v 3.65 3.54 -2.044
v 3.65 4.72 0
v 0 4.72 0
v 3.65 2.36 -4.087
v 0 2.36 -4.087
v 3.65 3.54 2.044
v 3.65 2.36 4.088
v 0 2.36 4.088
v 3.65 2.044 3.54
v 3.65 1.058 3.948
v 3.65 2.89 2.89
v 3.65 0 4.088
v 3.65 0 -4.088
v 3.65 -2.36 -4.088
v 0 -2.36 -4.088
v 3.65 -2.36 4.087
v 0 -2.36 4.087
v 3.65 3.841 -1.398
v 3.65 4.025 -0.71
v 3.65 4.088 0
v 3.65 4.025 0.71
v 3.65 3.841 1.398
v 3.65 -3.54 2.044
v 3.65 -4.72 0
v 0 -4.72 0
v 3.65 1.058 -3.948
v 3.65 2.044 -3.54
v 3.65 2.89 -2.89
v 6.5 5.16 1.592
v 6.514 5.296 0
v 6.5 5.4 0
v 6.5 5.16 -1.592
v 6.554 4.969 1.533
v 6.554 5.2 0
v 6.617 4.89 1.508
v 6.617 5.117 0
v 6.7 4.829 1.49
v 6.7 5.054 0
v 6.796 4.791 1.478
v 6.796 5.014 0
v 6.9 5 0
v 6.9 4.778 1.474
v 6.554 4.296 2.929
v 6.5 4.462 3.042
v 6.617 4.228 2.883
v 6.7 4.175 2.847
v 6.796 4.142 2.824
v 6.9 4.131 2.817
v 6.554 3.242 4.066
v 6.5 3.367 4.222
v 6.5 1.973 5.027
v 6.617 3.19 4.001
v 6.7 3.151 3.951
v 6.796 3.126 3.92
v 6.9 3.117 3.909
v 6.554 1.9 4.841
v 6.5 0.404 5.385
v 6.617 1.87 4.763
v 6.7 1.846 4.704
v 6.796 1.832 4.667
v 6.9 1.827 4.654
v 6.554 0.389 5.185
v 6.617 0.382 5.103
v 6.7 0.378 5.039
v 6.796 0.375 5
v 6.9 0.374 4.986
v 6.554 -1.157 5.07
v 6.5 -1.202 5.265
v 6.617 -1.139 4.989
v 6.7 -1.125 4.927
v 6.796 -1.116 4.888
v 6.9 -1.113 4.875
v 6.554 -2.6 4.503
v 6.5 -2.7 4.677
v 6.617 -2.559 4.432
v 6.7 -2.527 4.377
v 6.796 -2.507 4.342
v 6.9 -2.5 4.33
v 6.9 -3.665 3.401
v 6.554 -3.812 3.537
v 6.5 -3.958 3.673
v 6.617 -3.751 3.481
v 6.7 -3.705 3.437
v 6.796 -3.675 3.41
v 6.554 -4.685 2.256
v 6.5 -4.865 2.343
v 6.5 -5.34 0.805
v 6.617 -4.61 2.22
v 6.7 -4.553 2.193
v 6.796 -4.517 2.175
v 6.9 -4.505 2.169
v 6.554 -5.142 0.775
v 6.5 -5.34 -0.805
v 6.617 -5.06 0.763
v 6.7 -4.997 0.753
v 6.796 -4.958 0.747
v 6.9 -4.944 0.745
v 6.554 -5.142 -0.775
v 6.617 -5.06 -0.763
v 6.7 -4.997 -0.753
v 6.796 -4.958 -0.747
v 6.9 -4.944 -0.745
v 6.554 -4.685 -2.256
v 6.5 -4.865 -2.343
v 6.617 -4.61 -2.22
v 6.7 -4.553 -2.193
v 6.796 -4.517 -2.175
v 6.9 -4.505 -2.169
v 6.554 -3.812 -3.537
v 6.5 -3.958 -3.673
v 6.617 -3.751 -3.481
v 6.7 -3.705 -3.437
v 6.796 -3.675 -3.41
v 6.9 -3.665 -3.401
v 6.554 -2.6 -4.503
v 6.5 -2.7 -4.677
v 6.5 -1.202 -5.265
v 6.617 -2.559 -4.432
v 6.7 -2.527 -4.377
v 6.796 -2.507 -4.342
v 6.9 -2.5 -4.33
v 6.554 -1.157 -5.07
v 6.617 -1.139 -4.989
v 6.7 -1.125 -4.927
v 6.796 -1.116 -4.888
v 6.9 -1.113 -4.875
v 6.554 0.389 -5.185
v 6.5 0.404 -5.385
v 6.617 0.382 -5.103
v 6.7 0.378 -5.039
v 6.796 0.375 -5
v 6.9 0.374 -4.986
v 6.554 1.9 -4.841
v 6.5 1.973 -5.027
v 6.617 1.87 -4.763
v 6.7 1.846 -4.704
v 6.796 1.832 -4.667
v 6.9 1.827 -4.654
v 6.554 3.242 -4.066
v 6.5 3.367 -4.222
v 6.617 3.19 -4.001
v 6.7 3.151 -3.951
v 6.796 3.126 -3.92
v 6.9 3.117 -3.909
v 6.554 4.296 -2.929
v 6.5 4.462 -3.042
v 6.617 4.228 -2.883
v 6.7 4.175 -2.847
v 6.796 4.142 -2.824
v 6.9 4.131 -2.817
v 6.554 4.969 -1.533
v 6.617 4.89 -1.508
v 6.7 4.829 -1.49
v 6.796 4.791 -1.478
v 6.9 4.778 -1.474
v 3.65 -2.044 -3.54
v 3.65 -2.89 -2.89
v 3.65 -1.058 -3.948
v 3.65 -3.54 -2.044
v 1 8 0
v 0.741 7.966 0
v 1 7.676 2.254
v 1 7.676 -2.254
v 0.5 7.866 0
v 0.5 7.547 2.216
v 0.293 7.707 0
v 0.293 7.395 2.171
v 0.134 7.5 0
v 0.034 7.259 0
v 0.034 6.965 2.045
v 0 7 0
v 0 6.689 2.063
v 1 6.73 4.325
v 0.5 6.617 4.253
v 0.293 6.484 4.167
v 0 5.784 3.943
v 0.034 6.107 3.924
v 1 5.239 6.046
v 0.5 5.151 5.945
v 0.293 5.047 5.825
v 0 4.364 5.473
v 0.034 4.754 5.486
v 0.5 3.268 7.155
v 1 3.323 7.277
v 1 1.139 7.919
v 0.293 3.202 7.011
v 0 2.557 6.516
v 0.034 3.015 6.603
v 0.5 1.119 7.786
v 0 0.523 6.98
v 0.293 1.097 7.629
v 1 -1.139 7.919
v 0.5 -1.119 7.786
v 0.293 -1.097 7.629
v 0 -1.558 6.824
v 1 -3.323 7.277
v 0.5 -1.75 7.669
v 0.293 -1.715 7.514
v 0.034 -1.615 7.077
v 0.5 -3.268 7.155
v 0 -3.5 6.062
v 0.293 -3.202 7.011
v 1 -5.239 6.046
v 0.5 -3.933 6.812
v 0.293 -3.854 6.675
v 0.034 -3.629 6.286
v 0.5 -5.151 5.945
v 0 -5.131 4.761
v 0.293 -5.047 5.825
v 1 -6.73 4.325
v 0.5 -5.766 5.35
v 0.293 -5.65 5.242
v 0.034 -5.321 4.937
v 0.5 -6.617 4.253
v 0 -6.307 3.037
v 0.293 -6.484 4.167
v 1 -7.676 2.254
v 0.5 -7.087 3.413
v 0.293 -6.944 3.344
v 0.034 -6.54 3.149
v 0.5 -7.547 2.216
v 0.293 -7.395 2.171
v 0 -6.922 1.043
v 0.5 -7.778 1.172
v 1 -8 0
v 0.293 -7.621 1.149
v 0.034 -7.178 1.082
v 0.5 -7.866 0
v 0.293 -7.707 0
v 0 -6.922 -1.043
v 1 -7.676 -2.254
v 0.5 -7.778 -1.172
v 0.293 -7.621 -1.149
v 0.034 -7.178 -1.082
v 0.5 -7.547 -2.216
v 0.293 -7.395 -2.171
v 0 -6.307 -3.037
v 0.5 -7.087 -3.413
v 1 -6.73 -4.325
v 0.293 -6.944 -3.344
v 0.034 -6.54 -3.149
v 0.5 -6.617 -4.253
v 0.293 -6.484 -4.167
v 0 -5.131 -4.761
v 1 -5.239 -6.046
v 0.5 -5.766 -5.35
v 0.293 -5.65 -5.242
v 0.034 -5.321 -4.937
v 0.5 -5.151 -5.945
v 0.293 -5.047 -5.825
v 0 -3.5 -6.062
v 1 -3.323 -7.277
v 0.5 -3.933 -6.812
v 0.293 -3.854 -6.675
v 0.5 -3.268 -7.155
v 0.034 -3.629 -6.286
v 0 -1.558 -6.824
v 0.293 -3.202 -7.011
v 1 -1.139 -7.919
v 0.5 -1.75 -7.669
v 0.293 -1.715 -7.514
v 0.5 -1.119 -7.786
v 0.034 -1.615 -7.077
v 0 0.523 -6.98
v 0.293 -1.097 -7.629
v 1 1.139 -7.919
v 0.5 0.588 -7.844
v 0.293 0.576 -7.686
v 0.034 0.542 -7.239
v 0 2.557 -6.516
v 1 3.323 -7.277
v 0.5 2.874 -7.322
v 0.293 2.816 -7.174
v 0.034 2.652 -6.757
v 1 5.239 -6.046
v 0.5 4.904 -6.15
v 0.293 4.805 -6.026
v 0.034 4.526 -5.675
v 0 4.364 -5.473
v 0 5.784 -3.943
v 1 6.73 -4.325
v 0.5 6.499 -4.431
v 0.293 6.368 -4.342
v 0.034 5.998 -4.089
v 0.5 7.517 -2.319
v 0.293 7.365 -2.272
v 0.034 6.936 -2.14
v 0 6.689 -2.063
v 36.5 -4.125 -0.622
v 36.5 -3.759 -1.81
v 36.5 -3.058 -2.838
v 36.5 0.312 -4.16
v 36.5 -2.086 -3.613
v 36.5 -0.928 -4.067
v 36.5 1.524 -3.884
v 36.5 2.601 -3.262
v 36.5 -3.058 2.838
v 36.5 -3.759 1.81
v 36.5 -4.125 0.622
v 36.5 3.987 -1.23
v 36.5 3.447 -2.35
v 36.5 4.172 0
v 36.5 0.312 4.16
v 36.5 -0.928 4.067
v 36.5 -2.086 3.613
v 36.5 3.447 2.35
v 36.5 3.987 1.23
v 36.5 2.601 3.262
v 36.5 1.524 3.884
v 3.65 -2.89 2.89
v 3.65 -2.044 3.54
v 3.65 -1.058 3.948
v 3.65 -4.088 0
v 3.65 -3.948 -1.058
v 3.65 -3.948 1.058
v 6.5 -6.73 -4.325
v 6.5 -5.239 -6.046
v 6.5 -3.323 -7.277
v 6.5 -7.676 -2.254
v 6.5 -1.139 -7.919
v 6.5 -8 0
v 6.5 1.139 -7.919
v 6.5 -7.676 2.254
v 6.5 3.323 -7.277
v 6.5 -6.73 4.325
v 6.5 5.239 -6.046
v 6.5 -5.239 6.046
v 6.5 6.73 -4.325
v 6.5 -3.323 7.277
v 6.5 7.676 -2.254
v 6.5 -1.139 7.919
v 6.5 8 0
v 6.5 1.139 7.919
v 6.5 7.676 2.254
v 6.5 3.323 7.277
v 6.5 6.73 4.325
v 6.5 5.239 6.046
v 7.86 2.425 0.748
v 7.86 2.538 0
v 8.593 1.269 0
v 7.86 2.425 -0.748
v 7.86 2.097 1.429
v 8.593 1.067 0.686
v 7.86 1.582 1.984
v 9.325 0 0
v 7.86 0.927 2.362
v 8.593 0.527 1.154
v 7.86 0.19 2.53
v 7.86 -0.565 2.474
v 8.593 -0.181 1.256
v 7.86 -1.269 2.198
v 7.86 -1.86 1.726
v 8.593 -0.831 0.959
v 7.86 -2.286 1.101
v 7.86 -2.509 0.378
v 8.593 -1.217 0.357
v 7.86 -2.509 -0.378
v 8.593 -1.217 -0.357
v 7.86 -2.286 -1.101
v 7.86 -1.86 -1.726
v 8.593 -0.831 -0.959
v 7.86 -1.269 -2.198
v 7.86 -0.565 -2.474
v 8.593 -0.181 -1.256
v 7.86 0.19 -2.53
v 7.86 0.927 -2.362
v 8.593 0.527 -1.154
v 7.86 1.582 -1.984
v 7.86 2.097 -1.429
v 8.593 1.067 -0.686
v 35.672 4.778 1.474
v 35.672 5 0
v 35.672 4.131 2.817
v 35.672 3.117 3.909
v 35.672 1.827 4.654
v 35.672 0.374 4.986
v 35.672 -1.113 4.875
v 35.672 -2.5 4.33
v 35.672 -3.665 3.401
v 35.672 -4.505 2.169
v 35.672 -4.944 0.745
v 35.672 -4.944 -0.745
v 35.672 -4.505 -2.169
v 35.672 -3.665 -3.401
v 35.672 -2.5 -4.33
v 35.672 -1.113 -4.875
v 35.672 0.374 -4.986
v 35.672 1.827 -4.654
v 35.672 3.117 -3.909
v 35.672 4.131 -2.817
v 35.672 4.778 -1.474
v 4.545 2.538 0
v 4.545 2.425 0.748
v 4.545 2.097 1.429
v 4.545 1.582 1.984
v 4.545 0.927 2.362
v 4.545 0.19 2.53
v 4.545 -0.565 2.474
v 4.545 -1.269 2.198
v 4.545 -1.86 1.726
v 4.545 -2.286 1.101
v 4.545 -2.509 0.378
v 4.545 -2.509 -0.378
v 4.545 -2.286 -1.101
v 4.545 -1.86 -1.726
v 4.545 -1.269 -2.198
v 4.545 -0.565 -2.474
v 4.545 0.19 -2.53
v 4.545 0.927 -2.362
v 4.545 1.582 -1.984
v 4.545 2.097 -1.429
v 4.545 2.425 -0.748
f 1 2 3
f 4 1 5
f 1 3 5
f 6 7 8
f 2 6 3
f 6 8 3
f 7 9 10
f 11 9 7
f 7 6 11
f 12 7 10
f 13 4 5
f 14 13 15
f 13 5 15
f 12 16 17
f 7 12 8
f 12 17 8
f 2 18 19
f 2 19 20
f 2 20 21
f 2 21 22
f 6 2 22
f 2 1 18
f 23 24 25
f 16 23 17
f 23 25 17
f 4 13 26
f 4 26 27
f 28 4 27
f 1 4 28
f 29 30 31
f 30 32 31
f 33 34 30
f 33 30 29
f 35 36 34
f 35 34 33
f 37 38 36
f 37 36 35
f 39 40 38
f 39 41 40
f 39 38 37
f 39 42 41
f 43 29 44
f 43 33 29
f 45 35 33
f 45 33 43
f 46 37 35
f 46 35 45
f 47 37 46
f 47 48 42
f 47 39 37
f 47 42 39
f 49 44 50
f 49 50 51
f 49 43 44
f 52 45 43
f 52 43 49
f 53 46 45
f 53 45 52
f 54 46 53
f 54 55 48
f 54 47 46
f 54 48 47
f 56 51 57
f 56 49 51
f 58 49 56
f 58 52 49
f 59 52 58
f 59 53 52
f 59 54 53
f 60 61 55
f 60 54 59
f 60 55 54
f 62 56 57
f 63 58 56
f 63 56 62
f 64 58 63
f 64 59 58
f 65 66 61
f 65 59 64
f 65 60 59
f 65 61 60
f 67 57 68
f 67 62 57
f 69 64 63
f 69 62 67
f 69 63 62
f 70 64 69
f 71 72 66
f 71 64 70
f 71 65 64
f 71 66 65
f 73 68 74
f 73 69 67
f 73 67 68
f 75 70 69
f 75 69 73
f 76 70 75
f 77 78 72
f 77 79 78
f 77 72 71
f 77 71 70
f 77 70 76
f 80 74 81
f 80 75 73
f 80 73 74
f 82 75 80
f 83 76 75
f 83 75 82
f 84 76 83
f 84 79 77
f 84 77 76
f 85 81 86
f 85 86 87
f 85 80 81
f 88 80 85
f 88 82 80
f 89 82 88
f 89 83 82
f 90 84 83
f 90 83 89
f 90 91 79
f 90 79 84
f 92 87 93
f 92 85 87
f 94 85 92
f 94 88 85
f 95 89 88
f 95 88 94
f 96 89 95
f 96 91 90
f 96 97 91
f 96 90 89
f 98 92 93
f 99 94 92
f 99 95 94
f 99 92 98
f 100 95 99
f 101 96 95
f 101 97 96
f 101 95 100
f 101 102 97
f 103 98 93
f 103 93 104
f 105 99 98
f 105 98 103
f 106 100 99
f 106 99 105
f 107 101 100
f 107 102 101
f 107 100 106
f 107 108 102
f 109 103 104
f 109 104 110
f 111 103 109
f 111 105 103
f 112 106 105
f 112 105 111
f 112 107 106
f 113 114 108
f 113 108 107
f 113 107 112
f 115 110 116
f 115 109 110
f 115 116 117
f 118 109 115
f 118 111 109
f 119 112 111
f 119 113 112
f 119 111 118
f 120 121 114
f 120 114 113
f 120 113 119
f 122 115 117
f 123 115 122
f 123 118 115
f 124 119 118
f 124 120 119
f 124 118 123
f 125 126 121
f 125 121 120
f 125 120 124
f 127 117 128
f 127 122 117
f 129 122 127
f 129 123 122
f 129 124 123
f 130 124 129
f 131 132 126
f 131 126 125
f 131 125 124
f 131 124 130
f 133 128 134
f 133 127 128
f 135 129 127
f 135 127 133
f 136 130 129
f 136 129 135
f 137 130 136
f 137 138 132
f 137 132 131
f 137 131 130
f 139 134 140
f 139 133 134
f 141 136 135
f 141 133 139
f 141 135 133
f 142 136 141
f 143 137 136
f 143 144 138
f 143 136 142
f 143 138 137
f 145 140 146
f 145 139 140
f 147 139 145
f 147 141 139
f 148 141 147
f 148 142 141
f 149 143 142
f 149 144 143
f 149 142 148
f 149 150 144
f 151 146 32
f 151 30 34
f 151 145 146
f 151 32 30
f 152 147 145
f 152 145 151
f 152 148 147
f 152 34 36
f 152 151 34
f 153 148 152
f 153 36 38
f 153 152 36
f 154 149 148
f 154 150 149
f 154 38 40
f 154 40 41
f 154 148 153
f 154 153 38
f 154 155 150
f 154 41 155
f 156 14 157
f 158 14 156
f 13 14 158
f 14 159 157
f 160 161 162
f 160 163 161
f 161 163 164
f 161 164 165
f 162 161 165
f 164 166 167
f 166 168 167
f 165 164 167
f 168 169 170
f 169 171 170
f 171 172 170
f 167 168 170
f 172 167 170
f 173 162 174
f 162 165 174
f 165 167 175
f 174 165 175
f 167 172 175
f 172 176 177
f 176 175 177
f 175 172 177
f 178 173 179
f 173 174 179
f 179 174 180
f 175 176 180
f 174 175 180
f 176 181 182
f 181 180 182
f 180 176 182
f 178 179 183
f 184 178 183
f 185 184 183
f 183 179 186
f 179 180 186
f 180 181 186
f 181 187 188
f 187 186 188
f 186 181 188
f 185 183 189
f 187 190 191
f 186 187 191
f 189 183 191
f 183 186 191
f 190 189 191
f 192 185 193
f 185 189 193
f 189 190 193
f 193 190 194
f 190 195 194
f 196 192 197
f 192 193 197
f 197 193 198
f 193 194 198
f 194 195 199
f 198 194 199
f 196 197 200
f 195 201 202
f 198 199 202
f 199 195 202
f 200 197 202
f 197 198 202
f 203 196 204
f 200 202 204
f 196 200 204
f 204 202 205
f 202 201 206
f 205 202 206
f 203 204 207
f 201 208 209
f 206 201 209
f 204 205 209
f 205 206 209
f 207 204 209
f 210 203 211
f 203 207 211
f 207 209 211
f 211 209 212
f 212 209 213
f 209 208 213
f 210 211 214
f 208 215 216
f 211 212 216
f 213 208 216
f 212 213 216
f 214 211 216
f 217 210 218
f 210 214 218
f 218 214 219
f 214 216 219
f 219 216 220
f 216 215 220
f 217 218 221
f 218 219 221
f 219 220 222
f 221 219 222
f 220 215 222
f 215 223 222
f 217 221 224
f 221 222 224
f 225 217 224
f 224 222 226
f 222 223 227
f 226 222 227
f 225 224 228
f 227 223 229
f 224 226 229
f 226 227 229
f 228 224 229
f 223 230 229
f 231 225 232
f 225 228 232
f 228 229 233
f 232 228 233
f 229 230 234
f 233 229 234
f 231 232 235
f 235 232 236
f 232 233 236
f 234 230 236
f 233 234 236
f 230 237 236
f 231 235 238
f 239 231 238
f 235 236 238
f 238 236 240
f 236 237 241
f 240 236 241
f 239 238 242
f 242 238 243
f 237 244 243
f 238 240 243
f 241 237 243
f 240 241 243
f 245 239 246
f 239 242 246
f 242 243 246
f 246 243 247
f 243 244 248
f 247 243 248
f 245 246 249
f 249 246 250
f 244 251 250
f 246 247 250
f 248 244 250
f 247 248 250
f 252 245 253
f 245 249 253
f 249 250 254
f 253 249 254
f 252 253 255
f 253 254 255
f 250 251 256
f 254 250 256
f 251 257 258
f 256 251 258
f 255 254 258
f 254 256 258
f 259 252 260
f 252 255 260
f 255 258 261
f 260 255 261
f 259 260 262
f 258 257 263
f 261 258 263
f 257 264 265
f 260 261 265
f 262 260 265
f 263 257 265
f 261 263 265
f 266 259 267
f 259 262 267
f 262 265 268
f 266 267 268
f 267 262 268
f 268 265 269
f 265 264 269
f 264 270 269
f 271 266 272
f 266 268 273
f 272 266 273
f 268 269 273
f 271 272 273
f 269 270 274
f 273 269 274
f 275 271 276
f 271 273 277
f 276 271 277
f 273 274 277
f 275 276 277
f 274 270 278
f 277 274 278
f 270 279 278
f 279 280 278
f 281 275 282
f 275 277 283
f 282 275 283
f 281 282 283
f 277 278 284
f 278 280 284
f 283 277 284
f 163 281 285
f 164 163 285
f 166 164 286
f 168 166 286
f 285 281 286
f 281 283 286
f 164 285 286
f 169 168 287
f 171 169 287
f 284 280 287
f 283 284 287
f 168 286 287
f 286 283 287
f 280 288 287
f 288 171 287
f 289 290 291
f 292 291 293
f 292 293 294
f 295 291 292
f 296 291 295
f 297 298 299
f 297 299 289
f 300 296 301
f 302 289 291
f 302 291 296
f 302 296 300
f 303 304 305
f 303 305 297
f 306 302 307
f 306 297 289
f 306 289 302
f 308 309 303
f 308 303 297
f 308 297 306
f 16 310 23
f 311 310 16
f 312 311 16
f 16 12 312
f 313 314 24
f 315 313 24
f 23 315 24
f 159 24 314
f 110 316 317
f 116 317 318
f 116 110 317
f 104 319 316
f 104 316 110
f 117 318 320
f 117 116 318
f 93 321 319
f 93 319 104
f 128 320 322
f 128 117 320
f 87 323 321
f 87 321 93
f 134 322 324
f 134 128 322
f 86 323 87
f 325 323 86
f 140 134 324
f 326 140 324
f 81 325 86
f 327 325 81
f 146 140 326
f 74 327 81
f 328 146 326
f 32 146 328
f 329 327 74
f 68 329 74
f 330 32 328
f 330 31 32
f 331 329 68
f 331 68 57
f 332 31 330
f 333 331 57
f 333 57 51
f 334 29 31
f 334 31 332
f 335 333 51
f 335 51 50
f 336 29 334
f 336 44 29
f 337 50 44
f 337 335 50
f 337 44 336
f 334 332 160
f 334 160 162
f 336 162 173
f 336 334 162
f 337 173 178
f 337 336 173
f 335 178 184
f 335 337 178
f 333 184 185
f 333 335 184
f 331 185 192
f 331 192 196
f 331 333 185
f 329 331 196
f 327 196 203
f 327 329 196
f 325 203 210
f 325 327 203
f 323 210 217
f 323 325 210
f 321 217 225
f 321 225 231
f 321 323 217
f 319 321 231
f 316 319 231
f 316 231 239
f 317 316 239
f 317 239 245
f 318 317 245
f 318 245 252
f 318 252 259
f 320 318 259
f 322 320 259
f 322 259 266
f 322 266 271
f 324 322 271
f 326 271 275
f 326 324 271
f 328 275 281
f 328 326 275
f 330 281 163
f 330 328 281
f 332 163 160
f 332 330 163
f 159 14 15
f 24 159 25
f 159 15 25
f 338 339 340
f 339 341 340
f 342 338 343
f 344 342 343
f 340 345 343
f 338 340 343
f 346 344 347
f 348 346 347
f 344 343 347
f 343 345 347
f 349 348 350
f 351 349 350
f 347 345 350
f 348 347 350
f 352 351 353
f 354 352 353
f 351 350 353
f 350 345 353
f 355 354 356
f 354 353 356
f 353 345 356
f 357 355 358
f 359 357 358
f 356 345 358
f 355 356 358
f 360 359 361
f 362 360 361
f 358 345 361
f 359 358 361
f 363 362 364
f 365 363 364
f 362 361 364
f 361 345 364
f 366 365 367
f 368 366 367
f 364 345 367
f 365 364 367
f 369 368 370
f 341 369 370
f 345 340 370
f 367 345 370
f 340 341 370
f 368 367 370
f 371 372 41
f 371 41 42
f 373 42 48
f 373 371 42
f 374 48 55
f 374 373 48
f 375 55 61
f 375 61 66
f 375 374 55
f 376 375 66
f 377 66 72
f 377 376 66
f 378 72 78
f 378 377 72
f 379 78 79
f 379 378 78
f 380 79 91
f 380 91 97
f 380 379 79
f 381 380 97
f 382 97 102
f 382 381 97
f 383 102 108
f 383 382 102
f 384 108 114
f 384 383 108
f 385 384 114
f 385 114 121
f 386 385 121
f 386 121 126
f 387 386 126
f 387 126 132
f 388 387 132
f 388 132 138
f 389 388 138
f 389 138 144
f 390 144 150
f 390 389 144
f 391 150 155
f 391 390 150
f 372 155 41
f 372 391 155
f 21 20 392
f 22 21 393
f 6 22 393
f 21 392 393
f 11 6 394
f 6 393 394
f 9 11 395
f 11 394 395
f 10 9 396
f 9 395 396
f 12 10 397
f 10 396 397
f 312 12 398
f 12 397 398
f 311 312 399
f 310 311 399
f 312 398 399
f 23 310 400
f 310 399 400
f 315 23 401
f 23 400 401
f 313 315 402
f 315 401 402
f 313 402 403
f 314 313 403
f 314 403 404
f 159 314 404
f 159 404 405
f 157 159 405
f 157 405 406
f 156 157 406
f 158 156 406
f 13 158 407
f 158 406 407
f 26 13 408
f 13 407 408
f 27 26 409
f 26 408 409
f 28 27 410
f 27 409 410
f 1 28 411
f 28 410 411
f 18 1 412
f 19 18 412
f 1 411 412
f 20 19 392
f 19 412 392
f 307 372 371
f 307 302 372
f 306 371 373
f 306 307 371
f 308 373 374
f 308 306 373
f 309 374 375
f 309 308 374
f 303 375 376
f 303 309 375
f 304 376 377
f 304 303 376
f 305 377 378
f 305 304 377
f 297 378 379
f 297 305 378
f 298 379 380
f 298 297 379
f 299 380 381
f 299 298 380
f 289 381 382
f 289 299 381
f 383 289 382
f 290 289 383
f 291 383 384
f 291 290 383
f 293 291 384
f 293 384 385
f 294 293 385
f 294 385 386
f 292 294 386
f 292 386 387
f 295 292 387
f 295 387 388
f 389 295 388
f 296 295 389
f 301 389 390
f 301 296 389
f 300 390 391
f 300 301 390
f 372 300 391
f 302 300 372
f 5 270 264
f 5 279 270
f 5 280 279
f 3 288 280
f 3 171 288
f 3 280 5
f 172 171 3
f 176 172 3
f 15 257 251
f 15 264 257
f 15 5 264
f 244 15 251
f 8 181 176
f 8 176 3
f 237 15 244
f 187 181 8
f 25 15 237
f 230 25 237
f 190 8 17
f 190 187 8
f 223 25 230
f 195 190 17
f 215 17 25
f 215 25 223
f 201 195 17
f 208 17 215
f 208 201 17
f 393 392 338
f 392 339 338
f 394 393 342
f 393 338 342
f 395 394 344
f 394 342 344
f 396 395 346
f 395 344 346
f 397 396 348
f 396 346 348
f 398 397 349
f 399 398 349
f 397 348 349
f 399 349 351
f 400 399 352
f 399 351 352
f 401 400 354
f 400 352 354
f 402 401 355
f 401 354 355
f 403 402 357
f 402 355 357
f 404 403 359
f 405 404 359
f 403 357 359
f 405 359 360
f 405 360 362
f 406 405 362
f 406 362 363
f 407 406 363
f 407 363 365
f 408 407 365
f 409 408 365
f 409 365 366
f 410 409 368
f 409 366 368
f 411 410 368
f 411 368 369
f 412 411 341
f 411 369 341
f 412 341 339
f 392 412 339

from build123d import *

# Parameters (mm, degrees)
FILLET1_R   = 0.4
FILLET2_R   = 1
HEX_2_DEPTH = 3.65


with BuildPart() as part:
    # BodySke → Base-Revolve (revolve)
    with BuildSketch(Plane.XY):
        Polygon((0, 0), (0, 8), (6.5, 8), (6.5, 5), (35.672, 5), (36.5, 4.172), (36.5, 0), align=None)
    revolve(axis=Axis((-31.75, 0, 0), (1, 0, 0)))

    # Fillet1
    fillet1_edges = [part.edges().sort_by_distance(p)[0] for p in [
        (6.5, -5, 0),
    ]]
    fillet(fillet1_edges, radius=FILLET1_R)

    # Fillet2
    fillet2_edges = [part.edges().sort_by_distance(p)[0] for p in [
        (0, -8, 0),
    ]]
    fillet(fillet2_edges, radius=FILLET2_R)

    # HexSke → Hex 2 (cut)
    with BuildSketch(Plane(origin=(0, 0, 0), x_dir=(0, 0.5, 0.866025404), z_dir=(-1, 0, 0))):
        Polygon((2.359919225, 4.0875), (-2.359919225, 4.0875), (-4.719838451, 0), (-2.359919225, -4.0875), (2.359919225, -4.0875), (4.719838451, 0), align=None)
    extrude(amount=-HEX_2_DEPTH, mode=Mode.SUBTRACT)

    # PilotSke → Hex-PreBroach (revolve, cut)
    with BuildSketch(Plane.XY):
        Polygon((0, 4.0875), (3.65, 4.0875), (4.544892917, 2.5375), (7.86, 2.5375), (9.325026308, 0), (0, 0), align=None)
    revolve(axis=Axis((0, 0, 0), (1, 0, 0)), mode=Mode.SUBTRACT)


solid = part.part
